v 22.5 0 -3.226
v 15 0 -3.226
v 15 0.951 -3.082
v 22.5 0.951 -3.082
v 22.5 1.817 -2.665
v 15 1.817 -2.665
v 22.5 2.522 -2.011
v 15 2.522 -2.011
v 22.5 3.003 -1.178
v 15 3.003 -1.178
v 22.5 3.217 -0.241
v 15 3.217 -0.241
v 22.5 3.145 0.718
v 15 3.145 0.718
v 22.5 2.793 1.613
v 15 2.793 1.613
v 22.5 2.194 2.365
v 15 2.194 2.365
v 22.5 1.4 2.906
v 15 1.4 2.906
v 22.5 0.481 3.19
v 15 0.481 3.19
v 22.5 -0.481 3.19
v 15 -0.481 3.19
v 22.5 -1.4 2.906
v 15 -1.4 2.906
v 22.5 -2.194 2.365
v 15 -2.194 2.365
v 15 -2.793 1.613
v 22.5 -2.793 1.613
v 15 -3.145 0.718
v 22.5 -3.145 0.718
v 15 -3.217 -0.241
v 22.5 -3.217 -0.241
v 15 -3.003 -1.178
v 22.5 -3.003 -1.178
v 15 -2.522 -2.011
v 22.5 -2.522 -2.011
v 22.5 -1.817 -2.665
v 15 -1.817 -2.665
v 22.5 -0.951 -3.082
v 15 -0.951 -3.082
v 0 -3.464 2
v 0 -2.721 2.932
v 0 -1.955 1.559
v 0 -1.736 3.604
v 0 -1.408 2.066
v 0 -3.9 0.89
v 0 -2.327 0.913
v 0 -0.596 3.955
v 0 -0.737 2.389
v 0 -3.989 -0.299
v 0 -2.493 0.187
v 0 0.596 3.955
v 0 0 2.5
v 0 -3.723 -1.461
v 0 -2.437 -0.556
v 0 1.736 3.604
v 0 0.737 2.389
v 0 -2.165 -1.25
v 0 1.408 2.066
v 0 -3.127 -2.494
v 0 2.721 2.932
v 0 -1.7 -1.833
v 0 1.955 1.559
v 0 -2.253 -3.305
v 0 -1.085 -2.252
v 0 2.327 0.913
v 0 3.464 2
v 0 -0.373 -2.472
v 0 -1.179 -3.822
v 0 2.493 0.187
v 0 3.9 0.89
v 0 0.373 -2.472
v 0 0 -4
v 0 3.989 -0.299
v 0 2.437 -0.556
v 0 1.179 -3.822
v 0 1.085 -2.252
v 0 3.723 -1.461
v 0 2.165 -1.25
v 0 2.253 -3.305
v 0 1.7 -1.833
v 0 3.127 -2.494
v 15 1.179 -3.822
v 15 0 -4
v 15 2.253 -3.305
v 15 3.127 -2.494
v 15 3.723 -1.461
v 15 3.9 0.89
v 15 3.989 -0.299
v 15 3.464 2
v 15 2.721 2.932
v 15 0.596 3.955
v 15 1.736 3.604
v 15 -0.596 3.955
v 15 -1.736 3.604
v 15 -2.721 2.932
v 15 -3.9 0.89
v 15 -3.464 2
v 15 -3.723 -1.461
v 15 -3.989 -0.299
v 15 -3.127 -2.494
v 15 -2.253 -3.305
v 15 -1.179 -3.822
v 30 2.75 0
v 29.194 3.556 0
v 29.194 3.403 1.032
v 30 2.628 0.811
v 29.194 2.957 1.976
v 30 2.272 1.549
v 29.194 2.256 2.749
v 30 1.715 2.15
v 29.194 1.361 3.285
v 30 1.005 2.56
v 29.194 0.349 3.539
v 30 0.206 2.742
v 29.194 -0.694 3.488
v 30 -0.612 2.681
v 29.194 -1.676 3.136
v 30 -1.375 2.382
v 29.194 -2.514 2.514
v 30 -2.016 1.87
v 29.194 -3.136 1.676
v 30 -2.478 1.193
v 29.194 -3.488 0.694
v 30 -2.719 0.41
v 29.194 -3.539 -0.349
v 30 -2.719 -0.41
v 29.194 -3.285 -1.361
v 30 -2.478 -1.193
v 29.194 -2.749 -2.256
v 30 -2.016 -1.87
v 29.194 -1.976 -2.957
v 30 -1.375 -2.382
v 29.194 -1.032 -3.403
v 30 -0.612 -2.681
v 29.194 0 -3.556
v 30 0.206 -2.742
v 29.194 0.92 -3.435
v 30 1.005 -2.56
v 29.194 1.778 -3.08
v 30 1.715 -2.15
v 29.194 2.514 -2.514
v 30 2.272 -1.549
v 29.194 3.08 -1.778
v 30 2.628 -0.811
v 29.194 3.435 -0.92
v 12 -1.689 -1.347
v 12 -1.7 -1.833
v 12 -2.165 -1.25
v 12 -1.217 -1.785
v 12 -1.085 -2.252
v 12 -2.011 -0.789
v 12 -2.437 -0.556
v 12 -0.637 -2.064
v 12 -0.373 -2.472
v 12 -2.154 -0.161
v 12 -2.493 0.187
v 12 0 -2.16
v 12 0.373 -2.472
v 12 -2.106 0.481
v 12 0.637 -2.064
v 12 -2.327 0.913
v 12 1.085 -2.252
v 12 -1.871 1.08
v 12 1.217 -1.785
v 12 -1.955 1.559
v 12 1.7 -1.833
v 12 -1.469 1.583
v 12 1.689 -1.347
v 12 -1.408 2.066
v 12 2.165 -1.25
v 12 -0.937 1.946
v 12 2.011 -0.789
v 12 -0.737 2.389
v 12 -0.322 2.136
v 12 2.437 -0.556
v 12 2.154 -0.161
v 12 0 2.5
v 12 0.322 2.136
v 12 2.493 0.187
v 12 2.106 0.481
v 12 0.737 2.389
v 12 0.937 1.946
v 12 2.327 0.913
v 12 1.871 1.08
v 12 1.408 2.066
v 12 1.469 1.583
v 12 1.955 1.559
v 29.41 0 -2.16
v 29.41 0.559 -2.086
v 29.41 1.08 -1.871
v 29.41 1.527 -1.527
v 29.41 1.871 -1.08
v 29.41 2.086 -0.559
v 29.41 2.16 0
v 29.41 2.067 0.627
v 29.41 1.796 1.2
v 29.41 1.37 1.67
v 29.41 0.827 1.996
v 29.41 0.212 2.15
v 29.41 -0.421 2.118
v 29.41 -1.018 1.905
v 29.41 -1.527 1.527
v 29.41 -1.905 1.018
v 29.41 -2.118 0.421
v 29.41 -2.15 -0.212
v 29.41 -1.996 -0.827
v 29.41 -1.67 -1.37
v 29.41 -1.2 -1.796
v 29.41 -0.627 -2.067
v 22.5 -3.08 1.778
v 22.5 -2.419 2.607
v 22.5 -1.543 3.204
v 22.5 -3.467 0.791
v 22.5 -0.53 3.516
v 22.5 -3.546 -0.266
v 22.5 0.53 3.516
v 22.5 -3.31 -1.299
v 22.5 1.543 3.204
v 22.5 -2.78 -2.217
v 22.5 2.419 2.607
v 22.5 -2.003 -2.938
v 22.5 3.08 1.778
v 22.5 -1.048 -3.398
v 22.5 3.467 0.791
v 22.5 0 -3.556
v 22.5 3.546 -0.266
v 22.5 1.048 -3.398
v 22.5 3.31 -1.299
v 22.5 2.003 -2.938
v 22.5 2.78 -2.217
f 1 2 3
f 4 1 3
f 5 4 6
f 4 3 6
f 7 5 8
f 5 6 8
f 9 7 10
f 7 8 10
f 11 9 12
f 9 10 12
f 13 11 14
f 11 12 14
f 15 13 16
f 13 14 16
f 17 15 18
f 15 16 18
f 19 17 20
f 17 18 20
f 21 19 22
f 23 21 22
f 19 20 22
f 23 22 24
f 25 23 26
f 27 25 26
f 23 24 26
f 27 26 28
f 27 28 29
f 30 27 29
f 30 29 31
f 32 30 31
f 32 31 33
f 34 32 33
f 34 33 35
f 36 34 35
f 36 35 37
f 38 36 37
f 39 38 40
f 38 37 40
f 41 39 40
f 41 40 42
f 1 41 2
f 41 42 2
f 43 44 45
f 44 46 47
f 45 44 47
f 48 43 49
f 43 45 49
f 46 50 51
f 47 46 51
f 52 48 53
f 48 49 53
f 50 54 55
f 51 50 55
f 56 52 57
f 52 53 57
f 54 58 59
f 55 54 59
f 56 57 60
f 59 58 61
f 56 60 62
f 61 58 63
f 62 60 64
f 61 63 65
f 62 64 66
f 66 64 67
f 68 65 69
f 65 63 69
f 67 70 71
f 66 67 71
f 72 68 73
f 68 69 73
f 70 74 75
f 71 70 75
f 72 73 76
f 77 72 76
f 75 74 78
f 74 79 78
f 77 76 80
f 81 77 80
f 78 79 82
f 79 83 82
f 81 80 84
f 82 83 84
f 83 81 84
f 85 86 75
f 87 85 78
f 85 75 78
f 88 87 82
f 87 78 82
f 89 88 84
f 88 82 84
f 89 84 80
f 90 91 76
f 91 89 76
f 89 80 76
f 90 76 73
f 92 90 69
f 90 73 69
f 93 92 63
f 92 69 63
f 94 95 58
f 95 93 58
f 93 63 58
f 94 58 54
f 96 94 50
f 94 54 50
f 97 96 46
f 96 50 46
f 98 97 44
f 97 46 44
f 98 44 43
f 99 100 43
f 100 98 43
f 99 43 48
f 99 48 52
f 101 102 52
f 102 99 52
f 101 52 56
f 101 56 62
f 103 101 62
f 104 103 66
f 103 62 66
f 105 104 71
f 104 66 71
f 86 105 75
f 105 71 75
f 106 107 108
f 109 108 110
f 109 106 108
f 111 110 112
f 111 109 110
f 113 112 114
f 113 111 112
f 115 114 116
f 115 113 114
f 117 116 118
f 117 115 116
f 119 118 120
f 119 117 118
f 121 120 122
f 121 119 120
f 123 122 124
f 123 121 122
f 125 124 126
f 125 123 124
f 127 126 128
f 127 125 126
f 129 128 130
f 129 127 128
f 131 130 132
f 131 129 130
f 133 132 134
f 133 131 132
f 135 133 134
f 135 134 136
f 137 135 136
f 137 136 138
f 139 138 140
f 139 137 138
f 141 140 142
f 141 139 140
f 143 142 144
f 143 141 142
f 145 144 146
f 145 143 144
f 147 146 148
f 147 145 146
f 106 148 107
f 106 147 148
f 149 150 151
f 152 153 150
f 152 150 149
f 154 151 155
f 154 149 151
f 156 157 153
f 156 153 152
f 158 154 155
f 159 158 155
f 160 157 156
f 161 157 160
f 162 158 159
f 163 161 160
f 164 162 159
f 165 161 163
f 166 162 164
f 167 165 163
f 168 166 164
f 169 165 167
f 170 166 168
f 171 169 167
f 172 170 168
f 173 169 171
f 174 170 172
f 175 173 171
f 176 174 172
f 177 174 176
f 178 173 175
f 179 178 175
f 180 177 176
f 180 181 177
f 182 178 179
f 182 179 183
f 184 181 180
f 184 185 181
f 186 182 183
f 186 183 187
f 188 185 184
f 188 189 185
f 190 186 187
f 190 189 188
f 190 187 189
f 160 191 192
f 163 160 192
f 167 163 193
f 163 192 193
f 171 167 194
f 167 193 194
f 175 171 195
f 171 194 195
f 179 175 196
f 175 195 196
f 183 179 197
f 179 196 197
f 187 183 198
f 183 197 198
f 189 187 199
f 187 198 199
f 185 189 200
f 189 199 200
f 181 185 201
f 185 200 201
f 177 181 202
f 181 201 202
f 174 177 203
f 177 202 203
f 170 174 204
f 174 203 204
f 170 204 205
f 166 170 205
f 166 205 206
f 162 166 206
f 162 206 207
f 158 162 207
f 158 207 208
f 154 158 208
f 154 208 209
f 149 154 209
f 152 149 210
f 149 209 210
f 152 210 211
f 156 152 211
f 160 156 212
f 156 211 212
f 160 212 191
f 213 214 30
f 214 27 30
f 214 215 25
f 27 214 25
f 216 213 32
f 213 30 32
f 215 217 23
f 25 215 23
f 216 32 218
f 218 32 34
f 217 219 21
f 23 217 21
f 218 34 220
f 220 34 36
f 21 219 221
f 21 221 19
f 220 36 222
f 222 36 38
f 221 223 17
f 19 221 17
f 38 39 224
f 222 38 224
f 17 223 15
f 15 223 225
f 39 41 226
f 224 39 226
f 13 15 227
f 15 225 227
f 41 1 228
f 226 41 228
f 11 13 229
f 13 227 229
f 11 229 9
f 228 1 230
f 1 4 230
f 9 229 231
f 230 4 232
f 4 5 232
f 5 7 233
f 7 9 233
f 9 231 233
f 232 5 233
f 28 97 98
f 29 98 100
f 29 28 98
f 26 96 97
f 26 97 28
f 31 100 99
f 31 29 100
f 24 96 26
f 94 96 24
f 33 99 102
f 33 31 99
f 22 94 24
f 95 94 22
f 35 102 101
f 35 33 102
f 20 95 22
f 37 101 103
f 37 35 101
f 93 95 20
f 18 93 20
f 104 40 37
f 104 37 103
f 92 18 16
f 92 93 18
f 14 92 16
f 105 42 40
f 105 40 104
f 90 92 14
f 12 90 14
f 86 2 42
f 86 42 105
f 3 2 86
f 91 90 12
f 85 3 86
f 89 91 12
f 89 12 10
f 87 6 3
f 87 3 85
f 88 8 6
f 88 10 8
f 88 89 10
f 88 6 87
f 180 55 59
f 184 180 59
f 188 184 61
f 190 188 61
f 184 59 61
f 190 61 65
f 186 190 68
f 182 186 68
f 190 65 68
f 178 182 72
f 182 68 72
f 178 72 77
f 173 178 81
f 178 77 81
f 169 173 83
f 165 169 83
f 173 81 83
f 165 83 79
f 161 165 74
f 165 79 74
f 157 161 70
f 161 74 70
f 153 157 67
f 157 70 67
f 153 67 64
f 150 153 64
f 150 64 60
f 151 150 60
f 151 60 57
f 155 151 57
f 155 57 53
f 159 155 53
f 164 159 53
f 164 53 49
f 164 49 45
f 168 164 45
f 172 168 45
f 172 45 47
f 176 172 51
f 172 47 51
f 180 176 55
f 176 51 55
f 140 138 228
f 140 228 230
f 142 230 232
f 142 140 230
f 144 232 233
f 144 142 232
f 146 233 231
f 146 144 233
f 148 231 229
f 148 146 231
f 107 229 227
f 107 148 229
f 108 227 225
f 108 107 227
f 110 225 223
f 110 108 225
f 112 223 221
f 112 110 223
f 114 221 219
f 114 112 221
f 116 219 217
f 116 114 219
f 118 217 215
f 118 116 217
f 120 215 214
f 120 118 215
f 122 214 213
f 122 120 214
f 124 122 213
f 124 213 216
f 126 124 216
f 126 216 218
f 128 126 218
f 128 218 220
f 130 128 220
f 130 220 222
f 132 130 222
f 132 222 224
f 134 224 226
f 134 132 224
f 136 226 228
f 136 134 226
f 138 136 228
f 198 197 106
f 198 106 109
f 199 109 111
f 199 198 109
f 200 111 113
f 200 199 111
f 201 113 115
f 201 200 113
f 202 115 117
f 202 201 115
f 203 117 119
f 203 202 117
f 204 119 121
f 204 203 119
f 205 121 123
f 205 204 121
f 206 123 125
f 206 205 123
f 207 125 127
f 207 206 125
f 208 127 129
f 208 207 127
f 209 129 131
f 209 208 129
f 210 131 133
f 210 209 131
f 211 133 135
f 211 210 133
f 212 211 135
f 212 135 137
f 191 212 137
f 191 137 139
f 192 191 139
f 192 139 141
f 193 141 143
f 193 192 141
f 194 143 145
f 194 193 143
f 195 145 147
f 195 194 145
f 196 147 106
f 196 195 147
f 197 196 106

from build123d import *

# Parameters (mm, degrees)
SKETCH1_R           = 4
BOSS_EXTRUDE2_DEPTH = 30
SKETCH3_R           = 2.5
CUT_EXTRUDE1_DEPTH  = 12
SKETCH4_R           = 2.16
CUT_EXTRUDE2_DEPTH  = 31
SKETCH10_OUTSIDE_W  = 16.412
SKETCH10_OUTSIDE_H  = 16.412
SKETCH10_OUTSIDE_R  = 3.556
CUT_EXTRUDE3_DEPTH  = 15
SKETCH18_OUTSIDE_W  = 16.412
SKETCH18_OUTSIDE_H  = 16.412
SKETCH18_OUTSIDE_R  = 3.225571995
CUT_EXTRUDE4_DEPTH  = 7.5


with BuildPart() as part:
    # Sketch1 → Boss-Extrude2 (new body)
    with BuildSketch(Plane(origin=(0, 0, 0), x_dir=(0, 0, -1), z_dir=(1, 0, 0))):
        Circle(SKETCH1_R)
    extrude(amount=BOSS_EXTRUDE2_DEPTH)

    # Sketch3 → Cut-Extrude1 (cut)
    with BuildSketch(Plane.ZY):
        Circle(SKETCH3_R)
    extrude(amount=-CUT_EXTRUDE1_DEPTH, mode=Mode.SUBTRACT)

    # Sketch4 → Cut-Extrude2 (cut, through all)
    with BuildSketch(Plane(origin=(30, 0, 0), x_dir=(0, 0, -1), z_dir=(1, 0, 0))):
        Circle(SKETCH4_R)
    extrude(amount=-CUT_EXTRUDE2_DEPTH, mode=Mode.SUBTRACT)

    # Sketch10 outside → Cut-Extrude3 (cut)
    with BuildSketch(Plane(origin=(30, 0, 0), x_dir=(0, 0, -1), z_dir=(1, 0, 0))):
        Rectangle(SKETCH10_OUTSIDE_W, SKETCH10_OUTSIDE_H)
        Circle(SKETCH10_OUTSIDE_R, mode=Mode.SUBTRACT)
    extrude(amount=-CUT_EXTRUDE3_DEPTH, mode=Mode.SUBTRACT)

    # Sketch18 outside → Cut-Extrude4 (cut)
    with BuildSketch(Plane(origin=(15, 0, 0), x_dir=(0, 0, -1), z_dir=(1, 0, 0))):
        Rectangle(SKETCH18_OUTSIDE_W, SKETCH18_OUTSIDE_H)
        Circle(SKETCH18_OUTSIDE_R, mode=Mode.SUBTRACT)
    extrude(amount=CUT_EXTRUDE4_DEPTH, mode=Mode.SUBTRACT)

    # Sketch17 → Cut-Revolve1 (revolve, cut)
    with BuildSketch(Plane.XY):
        Polygon((28.84073404, 3.90926596), (30, 2.75), (28.84073404, 1.59073404), (31.351449917, 1.59073404), (31.351449917, 3.90926596), align=None)
    revolve(axis=Axis((12, 0, 0), (1, 0, 0)), mode=Mode.SUBTRACT)


solid = part.part
